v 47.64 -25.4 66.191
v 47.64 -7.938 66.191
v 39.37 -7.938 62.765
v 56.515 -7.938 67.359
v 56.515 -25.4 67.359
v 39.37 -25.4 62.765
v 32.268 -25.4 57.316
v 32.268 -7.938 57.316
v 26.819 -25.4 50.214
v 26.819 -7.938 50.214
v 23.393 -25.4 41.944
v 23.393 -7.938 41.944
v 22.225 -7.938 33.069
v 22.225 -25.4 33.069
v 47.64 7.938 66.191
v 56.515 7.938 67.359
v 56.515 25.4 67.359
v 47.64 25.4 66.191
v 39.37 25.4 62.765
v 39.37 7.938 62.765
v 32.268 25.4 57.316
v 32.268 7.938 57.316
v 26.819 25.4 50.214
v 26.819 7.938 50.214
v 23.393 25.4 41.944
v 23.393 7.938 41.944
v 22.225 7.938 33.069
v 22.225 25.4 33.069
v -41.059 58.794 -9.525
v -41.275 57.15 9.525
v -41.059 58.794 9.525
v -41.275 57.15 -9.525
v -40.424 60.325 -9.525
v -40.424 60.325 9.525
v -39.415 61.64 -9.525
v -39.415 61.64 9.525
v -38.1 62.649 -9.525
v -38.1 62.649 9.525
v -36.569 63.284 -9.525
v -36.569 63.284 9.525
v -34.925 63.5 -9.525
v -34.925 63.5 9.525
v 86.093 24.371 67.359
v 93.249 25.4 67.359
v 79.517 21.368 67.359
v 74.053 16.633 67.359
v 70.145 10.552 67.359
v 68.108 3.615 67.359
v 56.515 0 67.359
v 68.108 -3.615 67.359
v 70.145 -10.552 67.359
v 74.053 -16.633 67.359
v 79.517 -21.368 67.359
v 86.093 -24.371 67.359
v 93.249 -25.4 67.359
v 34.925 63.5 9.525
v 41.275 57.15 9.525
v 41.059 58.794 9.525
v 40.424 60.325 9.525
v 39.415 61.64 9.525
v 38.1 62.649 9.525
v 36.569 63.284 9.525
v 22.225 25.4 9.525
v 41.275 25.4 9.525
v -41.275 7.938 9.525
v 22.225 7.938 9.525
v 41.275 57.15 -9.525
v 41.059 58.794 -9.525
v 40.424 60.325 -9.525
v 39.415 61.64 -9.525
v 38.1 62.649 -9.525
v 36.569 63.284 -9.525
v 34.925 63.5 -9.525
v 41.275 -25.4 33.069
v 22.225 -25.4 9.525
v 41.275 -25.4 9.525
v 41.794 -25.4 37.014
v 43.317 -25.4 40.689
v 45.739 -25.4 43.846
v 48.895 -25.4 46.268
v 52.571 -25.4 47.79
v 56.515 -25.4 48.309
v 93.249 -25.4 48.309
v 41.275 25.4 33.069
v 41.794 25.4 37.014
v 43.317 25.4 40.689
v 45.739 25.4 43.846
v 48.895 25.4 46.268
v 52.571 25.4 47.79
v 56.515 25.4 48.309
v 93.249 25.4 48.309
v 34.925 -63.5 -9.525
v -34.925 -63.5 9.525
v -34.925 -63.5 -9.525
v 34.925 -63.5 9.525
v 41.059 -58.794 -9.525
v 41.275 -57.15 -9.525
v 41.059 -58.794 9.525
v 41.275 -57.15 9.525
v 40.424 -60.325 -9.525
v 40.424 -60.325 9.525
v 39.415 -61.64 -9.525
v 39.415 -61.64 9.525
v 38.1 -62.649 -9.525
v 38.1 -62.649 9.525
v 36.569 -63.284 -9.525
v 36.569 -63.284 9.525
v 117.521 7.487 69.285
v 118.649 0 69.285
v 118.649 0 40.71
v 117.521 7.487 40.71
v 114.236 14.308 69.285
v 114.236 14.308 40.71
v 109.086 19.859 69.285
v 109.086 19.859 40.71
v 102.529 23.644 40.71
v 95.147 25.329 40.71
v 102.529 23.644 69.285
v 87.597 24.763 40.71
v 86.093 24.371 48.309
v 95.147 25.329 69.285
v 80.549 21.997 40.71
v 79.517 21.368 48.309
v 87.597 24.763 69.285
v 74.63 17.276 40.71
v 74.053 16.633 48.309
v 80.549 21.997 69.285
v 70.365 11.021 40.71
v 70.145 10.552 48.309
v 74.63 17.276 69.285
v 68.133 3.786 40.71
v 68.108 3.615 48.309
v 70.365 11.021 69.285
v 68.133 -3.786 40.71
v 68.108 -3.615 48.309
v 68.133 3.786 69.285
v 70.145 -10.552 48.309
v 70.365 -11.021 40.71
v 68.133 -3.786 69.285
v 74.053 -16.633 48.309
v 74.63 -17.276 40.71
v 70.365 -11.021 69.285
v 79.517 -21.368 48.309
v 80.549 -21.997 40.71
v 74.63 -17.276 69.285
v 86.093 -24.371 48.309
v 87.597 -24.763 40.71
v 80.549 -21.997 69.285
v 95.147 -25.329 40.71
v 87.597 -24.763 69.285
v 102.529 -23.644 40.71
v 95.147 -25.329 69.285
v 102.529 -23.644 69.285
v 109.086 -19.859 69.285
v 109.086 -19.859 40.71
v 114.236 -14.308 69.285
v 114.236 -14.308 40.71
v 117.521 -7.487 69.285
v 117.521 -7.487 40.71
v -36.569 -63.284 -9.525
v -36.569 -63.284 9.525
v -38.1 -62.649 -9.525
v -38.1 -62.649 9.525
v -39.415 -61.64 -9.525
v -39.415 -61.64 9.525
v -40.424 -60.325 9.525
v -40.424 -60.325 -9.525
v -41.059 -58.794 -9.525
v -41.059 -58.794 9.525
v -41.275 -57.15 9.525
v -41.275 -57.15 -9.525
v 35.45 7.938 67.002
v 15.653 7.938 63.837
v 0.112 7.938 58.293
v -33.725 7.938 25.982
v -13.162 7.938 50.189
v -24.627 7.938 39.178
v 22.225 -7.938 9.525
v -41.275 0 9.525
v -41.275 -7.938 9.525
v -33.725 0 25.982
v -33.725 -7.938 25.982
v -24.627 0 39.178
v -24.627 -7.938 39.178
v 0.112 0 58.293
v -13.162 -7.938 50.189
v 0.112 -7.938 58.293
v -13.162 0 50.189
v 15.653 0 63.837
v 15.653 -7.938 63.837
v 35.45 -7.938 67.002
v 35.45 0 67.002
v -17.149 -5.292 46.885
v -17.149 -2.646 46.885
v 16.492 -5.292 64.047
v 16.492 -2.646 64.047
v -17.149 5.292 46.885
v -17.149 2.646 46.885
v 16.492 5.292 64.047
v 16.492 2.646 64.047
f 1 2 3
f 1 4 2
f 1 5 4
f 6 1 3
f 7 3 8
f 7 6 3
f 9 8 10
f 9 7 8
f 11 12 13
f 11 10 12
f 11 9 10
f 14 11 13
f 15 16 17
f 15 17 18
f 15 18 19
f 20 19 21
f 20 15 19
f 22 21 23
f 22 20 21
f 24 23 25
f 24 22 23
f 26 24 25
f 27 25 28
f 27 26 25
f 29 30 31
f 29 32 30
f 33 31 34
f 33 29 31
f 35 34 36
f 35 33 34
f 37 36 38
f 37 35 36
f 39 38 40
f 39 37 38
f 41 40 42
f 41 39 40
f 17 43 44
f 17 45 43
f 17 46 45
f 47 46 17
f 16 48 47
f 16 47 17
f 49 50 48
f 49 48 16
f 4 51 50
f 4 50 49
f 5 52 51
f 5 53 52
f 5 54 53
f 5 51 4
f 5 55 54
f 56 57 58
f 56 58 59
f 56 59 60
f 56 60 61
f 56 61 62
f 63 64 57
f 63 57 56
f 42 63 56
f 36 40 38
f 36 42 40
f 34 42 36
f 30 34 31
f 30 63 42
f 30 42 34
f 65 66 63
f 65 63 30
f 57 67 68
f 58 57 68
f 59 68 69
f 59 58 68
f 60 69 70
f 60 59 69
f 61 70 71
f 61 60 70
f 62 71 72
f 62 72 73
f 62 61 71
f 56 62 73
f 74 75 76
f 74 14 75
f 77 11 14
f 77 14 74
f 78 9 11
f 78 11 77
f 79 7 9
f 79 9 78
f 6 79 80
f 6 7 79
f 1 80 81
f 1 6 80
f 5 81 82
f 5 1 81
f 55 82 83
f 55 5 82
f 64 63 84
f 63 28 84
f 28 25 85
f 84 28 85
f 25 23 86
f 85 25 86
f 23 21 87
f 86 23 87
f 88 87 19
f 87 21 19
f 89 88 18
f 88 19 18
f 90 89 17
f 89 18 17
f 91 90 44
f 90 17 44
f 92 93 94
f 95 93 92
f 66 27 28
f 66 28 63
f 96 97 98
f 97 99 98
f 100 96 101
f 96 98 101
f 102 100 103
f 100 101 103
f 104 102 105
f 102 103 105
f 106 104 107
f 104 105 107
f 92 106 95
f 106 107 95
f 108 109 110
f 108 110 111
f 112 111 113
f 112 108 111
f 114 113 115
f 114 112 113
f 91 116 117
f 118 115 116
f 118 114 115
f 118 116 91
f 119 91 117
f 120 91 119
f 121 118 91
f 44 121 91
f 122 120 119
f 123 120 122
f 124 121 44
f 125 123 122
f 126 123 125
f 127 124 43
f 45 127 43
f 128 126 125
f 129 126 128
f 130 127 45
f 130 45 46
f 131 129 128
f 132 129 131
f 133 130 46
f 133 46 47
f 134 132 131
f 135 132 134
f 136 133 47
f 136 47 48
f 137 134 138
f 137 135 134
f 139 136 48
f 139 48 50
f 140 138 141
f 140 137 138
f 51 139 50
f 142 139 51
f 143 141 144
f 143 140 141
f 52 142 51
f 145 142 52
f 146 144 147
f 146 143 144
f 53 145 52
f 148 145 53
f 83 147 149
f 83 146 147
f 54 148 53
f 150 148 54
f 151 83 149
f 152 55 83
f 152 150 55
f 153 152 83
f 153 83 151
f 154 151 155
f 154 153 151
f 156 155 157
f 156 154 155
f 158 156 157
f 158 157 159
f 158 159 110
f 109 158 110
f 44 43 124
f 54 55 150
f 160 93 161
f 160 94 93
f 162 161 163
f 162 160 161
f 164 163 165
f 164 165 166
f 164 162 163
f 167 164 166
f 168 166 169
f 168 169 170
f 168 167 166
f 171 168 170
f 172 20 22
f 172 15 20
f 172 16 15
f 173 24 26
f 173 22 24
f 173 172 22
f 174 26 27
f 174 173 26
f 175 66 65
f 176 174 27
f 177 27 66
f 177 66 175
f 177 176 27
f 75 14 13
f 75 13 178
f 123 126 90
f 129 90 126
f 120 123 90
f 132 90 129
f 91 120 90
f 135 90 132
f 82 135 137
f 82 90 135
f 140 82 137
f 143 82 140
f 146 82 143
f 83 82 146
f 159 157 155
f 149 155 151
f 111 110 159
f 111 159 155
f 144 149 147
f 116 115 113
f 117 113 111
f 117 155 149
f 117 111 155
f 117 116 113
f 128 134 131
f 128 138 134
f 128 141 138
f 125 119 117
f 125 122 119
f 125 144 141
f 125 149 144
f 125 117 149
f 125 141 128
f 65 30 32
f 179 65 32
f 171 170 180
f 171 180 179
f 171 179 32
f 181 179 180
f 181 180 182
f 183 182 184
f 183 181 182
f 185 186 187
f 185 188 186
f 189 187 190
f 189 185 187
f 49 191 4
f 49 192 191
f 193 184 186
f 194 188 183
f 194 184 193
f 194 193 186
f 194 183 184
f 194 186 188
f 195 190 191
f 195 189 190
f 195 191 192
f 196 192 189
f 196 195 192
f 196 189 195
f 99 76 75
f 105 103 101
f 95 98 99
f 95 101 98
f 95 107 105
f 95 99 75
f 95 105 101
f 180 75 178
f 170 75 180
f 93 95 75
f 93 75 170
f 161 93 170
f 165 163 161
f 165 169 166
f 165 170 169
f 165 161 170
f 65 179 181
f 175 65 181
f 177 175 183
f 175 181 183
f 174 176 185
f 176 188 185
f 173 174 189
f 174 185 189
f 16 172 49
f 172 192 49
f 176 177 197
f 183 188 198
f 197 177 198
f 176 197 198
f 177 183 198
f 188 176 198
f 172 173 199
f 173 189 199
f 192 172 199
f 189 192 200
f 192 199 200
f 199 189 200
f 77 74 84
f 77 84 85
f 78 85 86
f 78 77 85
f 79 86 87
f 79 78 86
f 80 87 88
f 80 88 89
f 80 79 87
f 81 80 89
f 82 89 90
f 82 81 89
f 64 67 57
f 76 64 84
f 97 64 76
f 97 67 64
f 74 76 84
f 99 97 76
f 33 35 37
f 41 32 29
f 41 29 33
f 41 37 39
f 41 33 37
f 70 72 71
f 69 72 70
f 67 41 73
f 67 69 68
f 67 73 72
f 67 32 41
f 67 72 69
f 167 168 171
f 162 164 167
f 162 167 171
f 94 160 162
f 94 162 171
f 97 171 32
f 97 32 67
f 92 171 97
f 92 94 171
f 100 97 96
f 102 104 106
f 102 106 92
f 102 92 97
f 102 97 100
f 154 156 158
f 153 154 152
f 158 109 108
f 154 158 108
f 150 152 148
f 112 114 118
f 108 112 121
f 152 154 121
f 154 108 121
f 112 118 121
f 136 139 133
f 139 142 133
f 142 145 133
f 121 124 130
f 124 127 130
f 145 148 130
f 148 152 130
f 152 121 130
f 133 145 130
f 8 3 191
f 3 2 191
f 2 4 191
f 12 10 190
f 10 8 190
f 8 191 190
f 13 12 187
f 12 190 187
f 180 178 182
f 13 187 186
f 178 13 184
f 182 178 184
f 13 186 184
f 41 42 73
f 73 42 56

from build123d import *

# Parameters (mm, degrees)
F1_DEPTH = 63.5
F0_W     = 25.4
F0_H     = 19.05
F2_DEPTH = 25.4
F3_DEPTH = 7.9375
F0_H_2   = 7.599701224
F0_H_3   = 1.925298776
F5_R     = 6.35


with BuildPart() as f1:
    # F0 (on Front) → F1 (new body, symmetric)
    with BuildSketch(Plane.XZ):
        Polygon((-41.275, 9.525), (-41.275, -9.525), (41.275, -9.525), (41.275, 9.525), (22.225, 9.525), align=None)
    extrude(amount=F1_DEPTH, both=True)

    # F0 (on Front) → F2 (join, symmetric)
    with BuildSketch(Plane.XZ):
        with BuildLine():
            Line((22.225, 9.525), (41.275, 9.525))
            Line((41.275, 9.525), (41.275, 33.0692907344))
            ThreePointArc((41.275, 33.0692907344), (45.7386926547, 43.8455980797), (56.515, 48.3092907344))
            Line((56.515, 48.3092907344), (67.8493125877, 48.3092907344))
            Line((67.8493125877, 48.3092907344), (67.8493125877, 67.3592907344))
            Line((67.8493125877, 67.3592907344), (56.515, 67.3592907344))
            ThreePointArc((56.515, 67.3592907344), (32.2683084731, 57.3159822613), (22.225, 33.0692907344))
            Line((22.225, 33.0692907344), (22.225, 9.525))
        make_face()
        with Locations((80.5493125877, 57.8342907344)):
            Rectangle(F0_W, F0_H)
    extrude(amount=F2_DEPTH, both=True)

    # F0 (on Front) → F3 (join, symmetric)
    with BuildSketch(Plane.XZ):
        with BuildLine():
            add(Edge.make_bspline(
                [(-41.275, 9.525), (-22.9515824467, 59.1003261507), (14.3447369337, 68.8547492027), (56.515, 67.3592907344)],
                knots=[0, 0, 0, 0, 113.6120120619, 113.6120120619, 113.6120120619, 113.6120120619], degree=3))
            Line((-41.275, 9.525), (22.225, 9.525))
            Line((22.225, 9.525), (22.225, 33.0692907344))
            ThreePointArc((22.225, 33.0692907344), (32.2683084731, 57.3159822613), (56.515, 67.3592907344))
        make_face()
    extrude(amount=F3_DEPTH, both=True)

    # F0 (on Front) → F4 (revolve)
    with BuildSketch(Plane.XZ):
        with Locations((105.9493125877, 44.5094401224)):
            Rectangle(F0_W, F0_H_2)
        with Locations((105.9493125877, 57.8342907344)):
            Rectangle(F0_W, F0_H)
        with Locations((105.9493125877, 68.3219401224)):
            Rectangle(F0_W, F0_H_3)
    revolve(axis=Axis((93.2493125877, 0, 54.9970895104), (0, 0, 1)))

    # F5
    f5_edges = [f1.edges().sort_by_distance(p)[0] for p in [
        (-41.275, -63.5, 0),
        (41.275, -63.5, 0),
        (41.275, 63.5, 0),
        (-41.275, 63.5, 0),
    ]]
    fillet(f5_edges, radius=F5_R)


solid = f1.part
